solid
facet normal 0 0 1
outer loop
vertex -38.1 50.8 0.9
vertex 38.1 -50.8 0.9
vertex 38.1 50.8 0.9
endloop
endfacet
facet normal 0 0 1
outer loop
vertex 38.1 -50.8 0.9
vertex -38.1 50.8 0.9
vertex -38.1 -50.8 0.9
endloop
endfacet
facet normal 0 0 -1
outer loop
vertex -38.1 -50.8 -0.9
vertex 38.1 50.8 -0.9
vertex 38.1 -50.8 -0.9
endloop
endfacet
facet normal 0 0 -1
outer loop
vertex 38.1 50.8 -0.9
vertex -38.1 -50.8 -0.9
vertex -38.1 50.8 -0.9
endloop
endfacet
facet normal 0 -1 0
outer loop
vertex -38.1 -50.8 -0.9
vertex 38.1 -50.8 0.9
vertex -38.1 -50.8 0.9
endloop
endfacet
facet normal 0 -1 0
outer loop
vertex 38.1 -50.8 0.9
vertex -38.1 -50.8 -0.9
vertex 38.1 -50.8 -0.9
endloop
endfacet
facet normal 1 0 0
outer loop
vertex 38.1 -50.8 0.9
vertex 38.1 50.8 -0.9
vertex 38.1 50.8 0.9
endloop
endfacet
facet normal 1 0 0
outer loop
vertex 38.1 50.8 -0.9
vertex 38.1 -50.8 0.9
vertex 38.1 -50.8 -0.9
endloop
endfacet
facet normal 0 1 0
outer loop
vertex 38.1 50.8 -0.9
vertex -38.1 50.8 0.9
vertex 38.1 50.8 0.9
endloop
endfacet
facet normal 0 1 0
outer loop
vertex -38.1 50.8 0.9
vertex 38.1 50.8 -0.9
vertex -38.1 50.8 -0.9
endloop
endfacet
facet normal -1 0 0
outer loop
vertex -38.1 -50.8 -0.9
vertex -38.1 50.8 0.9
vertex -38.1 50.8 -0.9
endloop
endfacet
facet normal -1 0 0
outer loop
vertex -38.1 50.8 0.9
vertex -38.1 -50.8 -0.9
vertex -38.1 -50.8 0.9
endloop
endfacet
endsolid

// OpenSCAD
//Plate for maintaining orthogonality when measuring material sheets
length = 76.2;
width = 101.6;
height = 1.8;
cube([length,width,height], true);
